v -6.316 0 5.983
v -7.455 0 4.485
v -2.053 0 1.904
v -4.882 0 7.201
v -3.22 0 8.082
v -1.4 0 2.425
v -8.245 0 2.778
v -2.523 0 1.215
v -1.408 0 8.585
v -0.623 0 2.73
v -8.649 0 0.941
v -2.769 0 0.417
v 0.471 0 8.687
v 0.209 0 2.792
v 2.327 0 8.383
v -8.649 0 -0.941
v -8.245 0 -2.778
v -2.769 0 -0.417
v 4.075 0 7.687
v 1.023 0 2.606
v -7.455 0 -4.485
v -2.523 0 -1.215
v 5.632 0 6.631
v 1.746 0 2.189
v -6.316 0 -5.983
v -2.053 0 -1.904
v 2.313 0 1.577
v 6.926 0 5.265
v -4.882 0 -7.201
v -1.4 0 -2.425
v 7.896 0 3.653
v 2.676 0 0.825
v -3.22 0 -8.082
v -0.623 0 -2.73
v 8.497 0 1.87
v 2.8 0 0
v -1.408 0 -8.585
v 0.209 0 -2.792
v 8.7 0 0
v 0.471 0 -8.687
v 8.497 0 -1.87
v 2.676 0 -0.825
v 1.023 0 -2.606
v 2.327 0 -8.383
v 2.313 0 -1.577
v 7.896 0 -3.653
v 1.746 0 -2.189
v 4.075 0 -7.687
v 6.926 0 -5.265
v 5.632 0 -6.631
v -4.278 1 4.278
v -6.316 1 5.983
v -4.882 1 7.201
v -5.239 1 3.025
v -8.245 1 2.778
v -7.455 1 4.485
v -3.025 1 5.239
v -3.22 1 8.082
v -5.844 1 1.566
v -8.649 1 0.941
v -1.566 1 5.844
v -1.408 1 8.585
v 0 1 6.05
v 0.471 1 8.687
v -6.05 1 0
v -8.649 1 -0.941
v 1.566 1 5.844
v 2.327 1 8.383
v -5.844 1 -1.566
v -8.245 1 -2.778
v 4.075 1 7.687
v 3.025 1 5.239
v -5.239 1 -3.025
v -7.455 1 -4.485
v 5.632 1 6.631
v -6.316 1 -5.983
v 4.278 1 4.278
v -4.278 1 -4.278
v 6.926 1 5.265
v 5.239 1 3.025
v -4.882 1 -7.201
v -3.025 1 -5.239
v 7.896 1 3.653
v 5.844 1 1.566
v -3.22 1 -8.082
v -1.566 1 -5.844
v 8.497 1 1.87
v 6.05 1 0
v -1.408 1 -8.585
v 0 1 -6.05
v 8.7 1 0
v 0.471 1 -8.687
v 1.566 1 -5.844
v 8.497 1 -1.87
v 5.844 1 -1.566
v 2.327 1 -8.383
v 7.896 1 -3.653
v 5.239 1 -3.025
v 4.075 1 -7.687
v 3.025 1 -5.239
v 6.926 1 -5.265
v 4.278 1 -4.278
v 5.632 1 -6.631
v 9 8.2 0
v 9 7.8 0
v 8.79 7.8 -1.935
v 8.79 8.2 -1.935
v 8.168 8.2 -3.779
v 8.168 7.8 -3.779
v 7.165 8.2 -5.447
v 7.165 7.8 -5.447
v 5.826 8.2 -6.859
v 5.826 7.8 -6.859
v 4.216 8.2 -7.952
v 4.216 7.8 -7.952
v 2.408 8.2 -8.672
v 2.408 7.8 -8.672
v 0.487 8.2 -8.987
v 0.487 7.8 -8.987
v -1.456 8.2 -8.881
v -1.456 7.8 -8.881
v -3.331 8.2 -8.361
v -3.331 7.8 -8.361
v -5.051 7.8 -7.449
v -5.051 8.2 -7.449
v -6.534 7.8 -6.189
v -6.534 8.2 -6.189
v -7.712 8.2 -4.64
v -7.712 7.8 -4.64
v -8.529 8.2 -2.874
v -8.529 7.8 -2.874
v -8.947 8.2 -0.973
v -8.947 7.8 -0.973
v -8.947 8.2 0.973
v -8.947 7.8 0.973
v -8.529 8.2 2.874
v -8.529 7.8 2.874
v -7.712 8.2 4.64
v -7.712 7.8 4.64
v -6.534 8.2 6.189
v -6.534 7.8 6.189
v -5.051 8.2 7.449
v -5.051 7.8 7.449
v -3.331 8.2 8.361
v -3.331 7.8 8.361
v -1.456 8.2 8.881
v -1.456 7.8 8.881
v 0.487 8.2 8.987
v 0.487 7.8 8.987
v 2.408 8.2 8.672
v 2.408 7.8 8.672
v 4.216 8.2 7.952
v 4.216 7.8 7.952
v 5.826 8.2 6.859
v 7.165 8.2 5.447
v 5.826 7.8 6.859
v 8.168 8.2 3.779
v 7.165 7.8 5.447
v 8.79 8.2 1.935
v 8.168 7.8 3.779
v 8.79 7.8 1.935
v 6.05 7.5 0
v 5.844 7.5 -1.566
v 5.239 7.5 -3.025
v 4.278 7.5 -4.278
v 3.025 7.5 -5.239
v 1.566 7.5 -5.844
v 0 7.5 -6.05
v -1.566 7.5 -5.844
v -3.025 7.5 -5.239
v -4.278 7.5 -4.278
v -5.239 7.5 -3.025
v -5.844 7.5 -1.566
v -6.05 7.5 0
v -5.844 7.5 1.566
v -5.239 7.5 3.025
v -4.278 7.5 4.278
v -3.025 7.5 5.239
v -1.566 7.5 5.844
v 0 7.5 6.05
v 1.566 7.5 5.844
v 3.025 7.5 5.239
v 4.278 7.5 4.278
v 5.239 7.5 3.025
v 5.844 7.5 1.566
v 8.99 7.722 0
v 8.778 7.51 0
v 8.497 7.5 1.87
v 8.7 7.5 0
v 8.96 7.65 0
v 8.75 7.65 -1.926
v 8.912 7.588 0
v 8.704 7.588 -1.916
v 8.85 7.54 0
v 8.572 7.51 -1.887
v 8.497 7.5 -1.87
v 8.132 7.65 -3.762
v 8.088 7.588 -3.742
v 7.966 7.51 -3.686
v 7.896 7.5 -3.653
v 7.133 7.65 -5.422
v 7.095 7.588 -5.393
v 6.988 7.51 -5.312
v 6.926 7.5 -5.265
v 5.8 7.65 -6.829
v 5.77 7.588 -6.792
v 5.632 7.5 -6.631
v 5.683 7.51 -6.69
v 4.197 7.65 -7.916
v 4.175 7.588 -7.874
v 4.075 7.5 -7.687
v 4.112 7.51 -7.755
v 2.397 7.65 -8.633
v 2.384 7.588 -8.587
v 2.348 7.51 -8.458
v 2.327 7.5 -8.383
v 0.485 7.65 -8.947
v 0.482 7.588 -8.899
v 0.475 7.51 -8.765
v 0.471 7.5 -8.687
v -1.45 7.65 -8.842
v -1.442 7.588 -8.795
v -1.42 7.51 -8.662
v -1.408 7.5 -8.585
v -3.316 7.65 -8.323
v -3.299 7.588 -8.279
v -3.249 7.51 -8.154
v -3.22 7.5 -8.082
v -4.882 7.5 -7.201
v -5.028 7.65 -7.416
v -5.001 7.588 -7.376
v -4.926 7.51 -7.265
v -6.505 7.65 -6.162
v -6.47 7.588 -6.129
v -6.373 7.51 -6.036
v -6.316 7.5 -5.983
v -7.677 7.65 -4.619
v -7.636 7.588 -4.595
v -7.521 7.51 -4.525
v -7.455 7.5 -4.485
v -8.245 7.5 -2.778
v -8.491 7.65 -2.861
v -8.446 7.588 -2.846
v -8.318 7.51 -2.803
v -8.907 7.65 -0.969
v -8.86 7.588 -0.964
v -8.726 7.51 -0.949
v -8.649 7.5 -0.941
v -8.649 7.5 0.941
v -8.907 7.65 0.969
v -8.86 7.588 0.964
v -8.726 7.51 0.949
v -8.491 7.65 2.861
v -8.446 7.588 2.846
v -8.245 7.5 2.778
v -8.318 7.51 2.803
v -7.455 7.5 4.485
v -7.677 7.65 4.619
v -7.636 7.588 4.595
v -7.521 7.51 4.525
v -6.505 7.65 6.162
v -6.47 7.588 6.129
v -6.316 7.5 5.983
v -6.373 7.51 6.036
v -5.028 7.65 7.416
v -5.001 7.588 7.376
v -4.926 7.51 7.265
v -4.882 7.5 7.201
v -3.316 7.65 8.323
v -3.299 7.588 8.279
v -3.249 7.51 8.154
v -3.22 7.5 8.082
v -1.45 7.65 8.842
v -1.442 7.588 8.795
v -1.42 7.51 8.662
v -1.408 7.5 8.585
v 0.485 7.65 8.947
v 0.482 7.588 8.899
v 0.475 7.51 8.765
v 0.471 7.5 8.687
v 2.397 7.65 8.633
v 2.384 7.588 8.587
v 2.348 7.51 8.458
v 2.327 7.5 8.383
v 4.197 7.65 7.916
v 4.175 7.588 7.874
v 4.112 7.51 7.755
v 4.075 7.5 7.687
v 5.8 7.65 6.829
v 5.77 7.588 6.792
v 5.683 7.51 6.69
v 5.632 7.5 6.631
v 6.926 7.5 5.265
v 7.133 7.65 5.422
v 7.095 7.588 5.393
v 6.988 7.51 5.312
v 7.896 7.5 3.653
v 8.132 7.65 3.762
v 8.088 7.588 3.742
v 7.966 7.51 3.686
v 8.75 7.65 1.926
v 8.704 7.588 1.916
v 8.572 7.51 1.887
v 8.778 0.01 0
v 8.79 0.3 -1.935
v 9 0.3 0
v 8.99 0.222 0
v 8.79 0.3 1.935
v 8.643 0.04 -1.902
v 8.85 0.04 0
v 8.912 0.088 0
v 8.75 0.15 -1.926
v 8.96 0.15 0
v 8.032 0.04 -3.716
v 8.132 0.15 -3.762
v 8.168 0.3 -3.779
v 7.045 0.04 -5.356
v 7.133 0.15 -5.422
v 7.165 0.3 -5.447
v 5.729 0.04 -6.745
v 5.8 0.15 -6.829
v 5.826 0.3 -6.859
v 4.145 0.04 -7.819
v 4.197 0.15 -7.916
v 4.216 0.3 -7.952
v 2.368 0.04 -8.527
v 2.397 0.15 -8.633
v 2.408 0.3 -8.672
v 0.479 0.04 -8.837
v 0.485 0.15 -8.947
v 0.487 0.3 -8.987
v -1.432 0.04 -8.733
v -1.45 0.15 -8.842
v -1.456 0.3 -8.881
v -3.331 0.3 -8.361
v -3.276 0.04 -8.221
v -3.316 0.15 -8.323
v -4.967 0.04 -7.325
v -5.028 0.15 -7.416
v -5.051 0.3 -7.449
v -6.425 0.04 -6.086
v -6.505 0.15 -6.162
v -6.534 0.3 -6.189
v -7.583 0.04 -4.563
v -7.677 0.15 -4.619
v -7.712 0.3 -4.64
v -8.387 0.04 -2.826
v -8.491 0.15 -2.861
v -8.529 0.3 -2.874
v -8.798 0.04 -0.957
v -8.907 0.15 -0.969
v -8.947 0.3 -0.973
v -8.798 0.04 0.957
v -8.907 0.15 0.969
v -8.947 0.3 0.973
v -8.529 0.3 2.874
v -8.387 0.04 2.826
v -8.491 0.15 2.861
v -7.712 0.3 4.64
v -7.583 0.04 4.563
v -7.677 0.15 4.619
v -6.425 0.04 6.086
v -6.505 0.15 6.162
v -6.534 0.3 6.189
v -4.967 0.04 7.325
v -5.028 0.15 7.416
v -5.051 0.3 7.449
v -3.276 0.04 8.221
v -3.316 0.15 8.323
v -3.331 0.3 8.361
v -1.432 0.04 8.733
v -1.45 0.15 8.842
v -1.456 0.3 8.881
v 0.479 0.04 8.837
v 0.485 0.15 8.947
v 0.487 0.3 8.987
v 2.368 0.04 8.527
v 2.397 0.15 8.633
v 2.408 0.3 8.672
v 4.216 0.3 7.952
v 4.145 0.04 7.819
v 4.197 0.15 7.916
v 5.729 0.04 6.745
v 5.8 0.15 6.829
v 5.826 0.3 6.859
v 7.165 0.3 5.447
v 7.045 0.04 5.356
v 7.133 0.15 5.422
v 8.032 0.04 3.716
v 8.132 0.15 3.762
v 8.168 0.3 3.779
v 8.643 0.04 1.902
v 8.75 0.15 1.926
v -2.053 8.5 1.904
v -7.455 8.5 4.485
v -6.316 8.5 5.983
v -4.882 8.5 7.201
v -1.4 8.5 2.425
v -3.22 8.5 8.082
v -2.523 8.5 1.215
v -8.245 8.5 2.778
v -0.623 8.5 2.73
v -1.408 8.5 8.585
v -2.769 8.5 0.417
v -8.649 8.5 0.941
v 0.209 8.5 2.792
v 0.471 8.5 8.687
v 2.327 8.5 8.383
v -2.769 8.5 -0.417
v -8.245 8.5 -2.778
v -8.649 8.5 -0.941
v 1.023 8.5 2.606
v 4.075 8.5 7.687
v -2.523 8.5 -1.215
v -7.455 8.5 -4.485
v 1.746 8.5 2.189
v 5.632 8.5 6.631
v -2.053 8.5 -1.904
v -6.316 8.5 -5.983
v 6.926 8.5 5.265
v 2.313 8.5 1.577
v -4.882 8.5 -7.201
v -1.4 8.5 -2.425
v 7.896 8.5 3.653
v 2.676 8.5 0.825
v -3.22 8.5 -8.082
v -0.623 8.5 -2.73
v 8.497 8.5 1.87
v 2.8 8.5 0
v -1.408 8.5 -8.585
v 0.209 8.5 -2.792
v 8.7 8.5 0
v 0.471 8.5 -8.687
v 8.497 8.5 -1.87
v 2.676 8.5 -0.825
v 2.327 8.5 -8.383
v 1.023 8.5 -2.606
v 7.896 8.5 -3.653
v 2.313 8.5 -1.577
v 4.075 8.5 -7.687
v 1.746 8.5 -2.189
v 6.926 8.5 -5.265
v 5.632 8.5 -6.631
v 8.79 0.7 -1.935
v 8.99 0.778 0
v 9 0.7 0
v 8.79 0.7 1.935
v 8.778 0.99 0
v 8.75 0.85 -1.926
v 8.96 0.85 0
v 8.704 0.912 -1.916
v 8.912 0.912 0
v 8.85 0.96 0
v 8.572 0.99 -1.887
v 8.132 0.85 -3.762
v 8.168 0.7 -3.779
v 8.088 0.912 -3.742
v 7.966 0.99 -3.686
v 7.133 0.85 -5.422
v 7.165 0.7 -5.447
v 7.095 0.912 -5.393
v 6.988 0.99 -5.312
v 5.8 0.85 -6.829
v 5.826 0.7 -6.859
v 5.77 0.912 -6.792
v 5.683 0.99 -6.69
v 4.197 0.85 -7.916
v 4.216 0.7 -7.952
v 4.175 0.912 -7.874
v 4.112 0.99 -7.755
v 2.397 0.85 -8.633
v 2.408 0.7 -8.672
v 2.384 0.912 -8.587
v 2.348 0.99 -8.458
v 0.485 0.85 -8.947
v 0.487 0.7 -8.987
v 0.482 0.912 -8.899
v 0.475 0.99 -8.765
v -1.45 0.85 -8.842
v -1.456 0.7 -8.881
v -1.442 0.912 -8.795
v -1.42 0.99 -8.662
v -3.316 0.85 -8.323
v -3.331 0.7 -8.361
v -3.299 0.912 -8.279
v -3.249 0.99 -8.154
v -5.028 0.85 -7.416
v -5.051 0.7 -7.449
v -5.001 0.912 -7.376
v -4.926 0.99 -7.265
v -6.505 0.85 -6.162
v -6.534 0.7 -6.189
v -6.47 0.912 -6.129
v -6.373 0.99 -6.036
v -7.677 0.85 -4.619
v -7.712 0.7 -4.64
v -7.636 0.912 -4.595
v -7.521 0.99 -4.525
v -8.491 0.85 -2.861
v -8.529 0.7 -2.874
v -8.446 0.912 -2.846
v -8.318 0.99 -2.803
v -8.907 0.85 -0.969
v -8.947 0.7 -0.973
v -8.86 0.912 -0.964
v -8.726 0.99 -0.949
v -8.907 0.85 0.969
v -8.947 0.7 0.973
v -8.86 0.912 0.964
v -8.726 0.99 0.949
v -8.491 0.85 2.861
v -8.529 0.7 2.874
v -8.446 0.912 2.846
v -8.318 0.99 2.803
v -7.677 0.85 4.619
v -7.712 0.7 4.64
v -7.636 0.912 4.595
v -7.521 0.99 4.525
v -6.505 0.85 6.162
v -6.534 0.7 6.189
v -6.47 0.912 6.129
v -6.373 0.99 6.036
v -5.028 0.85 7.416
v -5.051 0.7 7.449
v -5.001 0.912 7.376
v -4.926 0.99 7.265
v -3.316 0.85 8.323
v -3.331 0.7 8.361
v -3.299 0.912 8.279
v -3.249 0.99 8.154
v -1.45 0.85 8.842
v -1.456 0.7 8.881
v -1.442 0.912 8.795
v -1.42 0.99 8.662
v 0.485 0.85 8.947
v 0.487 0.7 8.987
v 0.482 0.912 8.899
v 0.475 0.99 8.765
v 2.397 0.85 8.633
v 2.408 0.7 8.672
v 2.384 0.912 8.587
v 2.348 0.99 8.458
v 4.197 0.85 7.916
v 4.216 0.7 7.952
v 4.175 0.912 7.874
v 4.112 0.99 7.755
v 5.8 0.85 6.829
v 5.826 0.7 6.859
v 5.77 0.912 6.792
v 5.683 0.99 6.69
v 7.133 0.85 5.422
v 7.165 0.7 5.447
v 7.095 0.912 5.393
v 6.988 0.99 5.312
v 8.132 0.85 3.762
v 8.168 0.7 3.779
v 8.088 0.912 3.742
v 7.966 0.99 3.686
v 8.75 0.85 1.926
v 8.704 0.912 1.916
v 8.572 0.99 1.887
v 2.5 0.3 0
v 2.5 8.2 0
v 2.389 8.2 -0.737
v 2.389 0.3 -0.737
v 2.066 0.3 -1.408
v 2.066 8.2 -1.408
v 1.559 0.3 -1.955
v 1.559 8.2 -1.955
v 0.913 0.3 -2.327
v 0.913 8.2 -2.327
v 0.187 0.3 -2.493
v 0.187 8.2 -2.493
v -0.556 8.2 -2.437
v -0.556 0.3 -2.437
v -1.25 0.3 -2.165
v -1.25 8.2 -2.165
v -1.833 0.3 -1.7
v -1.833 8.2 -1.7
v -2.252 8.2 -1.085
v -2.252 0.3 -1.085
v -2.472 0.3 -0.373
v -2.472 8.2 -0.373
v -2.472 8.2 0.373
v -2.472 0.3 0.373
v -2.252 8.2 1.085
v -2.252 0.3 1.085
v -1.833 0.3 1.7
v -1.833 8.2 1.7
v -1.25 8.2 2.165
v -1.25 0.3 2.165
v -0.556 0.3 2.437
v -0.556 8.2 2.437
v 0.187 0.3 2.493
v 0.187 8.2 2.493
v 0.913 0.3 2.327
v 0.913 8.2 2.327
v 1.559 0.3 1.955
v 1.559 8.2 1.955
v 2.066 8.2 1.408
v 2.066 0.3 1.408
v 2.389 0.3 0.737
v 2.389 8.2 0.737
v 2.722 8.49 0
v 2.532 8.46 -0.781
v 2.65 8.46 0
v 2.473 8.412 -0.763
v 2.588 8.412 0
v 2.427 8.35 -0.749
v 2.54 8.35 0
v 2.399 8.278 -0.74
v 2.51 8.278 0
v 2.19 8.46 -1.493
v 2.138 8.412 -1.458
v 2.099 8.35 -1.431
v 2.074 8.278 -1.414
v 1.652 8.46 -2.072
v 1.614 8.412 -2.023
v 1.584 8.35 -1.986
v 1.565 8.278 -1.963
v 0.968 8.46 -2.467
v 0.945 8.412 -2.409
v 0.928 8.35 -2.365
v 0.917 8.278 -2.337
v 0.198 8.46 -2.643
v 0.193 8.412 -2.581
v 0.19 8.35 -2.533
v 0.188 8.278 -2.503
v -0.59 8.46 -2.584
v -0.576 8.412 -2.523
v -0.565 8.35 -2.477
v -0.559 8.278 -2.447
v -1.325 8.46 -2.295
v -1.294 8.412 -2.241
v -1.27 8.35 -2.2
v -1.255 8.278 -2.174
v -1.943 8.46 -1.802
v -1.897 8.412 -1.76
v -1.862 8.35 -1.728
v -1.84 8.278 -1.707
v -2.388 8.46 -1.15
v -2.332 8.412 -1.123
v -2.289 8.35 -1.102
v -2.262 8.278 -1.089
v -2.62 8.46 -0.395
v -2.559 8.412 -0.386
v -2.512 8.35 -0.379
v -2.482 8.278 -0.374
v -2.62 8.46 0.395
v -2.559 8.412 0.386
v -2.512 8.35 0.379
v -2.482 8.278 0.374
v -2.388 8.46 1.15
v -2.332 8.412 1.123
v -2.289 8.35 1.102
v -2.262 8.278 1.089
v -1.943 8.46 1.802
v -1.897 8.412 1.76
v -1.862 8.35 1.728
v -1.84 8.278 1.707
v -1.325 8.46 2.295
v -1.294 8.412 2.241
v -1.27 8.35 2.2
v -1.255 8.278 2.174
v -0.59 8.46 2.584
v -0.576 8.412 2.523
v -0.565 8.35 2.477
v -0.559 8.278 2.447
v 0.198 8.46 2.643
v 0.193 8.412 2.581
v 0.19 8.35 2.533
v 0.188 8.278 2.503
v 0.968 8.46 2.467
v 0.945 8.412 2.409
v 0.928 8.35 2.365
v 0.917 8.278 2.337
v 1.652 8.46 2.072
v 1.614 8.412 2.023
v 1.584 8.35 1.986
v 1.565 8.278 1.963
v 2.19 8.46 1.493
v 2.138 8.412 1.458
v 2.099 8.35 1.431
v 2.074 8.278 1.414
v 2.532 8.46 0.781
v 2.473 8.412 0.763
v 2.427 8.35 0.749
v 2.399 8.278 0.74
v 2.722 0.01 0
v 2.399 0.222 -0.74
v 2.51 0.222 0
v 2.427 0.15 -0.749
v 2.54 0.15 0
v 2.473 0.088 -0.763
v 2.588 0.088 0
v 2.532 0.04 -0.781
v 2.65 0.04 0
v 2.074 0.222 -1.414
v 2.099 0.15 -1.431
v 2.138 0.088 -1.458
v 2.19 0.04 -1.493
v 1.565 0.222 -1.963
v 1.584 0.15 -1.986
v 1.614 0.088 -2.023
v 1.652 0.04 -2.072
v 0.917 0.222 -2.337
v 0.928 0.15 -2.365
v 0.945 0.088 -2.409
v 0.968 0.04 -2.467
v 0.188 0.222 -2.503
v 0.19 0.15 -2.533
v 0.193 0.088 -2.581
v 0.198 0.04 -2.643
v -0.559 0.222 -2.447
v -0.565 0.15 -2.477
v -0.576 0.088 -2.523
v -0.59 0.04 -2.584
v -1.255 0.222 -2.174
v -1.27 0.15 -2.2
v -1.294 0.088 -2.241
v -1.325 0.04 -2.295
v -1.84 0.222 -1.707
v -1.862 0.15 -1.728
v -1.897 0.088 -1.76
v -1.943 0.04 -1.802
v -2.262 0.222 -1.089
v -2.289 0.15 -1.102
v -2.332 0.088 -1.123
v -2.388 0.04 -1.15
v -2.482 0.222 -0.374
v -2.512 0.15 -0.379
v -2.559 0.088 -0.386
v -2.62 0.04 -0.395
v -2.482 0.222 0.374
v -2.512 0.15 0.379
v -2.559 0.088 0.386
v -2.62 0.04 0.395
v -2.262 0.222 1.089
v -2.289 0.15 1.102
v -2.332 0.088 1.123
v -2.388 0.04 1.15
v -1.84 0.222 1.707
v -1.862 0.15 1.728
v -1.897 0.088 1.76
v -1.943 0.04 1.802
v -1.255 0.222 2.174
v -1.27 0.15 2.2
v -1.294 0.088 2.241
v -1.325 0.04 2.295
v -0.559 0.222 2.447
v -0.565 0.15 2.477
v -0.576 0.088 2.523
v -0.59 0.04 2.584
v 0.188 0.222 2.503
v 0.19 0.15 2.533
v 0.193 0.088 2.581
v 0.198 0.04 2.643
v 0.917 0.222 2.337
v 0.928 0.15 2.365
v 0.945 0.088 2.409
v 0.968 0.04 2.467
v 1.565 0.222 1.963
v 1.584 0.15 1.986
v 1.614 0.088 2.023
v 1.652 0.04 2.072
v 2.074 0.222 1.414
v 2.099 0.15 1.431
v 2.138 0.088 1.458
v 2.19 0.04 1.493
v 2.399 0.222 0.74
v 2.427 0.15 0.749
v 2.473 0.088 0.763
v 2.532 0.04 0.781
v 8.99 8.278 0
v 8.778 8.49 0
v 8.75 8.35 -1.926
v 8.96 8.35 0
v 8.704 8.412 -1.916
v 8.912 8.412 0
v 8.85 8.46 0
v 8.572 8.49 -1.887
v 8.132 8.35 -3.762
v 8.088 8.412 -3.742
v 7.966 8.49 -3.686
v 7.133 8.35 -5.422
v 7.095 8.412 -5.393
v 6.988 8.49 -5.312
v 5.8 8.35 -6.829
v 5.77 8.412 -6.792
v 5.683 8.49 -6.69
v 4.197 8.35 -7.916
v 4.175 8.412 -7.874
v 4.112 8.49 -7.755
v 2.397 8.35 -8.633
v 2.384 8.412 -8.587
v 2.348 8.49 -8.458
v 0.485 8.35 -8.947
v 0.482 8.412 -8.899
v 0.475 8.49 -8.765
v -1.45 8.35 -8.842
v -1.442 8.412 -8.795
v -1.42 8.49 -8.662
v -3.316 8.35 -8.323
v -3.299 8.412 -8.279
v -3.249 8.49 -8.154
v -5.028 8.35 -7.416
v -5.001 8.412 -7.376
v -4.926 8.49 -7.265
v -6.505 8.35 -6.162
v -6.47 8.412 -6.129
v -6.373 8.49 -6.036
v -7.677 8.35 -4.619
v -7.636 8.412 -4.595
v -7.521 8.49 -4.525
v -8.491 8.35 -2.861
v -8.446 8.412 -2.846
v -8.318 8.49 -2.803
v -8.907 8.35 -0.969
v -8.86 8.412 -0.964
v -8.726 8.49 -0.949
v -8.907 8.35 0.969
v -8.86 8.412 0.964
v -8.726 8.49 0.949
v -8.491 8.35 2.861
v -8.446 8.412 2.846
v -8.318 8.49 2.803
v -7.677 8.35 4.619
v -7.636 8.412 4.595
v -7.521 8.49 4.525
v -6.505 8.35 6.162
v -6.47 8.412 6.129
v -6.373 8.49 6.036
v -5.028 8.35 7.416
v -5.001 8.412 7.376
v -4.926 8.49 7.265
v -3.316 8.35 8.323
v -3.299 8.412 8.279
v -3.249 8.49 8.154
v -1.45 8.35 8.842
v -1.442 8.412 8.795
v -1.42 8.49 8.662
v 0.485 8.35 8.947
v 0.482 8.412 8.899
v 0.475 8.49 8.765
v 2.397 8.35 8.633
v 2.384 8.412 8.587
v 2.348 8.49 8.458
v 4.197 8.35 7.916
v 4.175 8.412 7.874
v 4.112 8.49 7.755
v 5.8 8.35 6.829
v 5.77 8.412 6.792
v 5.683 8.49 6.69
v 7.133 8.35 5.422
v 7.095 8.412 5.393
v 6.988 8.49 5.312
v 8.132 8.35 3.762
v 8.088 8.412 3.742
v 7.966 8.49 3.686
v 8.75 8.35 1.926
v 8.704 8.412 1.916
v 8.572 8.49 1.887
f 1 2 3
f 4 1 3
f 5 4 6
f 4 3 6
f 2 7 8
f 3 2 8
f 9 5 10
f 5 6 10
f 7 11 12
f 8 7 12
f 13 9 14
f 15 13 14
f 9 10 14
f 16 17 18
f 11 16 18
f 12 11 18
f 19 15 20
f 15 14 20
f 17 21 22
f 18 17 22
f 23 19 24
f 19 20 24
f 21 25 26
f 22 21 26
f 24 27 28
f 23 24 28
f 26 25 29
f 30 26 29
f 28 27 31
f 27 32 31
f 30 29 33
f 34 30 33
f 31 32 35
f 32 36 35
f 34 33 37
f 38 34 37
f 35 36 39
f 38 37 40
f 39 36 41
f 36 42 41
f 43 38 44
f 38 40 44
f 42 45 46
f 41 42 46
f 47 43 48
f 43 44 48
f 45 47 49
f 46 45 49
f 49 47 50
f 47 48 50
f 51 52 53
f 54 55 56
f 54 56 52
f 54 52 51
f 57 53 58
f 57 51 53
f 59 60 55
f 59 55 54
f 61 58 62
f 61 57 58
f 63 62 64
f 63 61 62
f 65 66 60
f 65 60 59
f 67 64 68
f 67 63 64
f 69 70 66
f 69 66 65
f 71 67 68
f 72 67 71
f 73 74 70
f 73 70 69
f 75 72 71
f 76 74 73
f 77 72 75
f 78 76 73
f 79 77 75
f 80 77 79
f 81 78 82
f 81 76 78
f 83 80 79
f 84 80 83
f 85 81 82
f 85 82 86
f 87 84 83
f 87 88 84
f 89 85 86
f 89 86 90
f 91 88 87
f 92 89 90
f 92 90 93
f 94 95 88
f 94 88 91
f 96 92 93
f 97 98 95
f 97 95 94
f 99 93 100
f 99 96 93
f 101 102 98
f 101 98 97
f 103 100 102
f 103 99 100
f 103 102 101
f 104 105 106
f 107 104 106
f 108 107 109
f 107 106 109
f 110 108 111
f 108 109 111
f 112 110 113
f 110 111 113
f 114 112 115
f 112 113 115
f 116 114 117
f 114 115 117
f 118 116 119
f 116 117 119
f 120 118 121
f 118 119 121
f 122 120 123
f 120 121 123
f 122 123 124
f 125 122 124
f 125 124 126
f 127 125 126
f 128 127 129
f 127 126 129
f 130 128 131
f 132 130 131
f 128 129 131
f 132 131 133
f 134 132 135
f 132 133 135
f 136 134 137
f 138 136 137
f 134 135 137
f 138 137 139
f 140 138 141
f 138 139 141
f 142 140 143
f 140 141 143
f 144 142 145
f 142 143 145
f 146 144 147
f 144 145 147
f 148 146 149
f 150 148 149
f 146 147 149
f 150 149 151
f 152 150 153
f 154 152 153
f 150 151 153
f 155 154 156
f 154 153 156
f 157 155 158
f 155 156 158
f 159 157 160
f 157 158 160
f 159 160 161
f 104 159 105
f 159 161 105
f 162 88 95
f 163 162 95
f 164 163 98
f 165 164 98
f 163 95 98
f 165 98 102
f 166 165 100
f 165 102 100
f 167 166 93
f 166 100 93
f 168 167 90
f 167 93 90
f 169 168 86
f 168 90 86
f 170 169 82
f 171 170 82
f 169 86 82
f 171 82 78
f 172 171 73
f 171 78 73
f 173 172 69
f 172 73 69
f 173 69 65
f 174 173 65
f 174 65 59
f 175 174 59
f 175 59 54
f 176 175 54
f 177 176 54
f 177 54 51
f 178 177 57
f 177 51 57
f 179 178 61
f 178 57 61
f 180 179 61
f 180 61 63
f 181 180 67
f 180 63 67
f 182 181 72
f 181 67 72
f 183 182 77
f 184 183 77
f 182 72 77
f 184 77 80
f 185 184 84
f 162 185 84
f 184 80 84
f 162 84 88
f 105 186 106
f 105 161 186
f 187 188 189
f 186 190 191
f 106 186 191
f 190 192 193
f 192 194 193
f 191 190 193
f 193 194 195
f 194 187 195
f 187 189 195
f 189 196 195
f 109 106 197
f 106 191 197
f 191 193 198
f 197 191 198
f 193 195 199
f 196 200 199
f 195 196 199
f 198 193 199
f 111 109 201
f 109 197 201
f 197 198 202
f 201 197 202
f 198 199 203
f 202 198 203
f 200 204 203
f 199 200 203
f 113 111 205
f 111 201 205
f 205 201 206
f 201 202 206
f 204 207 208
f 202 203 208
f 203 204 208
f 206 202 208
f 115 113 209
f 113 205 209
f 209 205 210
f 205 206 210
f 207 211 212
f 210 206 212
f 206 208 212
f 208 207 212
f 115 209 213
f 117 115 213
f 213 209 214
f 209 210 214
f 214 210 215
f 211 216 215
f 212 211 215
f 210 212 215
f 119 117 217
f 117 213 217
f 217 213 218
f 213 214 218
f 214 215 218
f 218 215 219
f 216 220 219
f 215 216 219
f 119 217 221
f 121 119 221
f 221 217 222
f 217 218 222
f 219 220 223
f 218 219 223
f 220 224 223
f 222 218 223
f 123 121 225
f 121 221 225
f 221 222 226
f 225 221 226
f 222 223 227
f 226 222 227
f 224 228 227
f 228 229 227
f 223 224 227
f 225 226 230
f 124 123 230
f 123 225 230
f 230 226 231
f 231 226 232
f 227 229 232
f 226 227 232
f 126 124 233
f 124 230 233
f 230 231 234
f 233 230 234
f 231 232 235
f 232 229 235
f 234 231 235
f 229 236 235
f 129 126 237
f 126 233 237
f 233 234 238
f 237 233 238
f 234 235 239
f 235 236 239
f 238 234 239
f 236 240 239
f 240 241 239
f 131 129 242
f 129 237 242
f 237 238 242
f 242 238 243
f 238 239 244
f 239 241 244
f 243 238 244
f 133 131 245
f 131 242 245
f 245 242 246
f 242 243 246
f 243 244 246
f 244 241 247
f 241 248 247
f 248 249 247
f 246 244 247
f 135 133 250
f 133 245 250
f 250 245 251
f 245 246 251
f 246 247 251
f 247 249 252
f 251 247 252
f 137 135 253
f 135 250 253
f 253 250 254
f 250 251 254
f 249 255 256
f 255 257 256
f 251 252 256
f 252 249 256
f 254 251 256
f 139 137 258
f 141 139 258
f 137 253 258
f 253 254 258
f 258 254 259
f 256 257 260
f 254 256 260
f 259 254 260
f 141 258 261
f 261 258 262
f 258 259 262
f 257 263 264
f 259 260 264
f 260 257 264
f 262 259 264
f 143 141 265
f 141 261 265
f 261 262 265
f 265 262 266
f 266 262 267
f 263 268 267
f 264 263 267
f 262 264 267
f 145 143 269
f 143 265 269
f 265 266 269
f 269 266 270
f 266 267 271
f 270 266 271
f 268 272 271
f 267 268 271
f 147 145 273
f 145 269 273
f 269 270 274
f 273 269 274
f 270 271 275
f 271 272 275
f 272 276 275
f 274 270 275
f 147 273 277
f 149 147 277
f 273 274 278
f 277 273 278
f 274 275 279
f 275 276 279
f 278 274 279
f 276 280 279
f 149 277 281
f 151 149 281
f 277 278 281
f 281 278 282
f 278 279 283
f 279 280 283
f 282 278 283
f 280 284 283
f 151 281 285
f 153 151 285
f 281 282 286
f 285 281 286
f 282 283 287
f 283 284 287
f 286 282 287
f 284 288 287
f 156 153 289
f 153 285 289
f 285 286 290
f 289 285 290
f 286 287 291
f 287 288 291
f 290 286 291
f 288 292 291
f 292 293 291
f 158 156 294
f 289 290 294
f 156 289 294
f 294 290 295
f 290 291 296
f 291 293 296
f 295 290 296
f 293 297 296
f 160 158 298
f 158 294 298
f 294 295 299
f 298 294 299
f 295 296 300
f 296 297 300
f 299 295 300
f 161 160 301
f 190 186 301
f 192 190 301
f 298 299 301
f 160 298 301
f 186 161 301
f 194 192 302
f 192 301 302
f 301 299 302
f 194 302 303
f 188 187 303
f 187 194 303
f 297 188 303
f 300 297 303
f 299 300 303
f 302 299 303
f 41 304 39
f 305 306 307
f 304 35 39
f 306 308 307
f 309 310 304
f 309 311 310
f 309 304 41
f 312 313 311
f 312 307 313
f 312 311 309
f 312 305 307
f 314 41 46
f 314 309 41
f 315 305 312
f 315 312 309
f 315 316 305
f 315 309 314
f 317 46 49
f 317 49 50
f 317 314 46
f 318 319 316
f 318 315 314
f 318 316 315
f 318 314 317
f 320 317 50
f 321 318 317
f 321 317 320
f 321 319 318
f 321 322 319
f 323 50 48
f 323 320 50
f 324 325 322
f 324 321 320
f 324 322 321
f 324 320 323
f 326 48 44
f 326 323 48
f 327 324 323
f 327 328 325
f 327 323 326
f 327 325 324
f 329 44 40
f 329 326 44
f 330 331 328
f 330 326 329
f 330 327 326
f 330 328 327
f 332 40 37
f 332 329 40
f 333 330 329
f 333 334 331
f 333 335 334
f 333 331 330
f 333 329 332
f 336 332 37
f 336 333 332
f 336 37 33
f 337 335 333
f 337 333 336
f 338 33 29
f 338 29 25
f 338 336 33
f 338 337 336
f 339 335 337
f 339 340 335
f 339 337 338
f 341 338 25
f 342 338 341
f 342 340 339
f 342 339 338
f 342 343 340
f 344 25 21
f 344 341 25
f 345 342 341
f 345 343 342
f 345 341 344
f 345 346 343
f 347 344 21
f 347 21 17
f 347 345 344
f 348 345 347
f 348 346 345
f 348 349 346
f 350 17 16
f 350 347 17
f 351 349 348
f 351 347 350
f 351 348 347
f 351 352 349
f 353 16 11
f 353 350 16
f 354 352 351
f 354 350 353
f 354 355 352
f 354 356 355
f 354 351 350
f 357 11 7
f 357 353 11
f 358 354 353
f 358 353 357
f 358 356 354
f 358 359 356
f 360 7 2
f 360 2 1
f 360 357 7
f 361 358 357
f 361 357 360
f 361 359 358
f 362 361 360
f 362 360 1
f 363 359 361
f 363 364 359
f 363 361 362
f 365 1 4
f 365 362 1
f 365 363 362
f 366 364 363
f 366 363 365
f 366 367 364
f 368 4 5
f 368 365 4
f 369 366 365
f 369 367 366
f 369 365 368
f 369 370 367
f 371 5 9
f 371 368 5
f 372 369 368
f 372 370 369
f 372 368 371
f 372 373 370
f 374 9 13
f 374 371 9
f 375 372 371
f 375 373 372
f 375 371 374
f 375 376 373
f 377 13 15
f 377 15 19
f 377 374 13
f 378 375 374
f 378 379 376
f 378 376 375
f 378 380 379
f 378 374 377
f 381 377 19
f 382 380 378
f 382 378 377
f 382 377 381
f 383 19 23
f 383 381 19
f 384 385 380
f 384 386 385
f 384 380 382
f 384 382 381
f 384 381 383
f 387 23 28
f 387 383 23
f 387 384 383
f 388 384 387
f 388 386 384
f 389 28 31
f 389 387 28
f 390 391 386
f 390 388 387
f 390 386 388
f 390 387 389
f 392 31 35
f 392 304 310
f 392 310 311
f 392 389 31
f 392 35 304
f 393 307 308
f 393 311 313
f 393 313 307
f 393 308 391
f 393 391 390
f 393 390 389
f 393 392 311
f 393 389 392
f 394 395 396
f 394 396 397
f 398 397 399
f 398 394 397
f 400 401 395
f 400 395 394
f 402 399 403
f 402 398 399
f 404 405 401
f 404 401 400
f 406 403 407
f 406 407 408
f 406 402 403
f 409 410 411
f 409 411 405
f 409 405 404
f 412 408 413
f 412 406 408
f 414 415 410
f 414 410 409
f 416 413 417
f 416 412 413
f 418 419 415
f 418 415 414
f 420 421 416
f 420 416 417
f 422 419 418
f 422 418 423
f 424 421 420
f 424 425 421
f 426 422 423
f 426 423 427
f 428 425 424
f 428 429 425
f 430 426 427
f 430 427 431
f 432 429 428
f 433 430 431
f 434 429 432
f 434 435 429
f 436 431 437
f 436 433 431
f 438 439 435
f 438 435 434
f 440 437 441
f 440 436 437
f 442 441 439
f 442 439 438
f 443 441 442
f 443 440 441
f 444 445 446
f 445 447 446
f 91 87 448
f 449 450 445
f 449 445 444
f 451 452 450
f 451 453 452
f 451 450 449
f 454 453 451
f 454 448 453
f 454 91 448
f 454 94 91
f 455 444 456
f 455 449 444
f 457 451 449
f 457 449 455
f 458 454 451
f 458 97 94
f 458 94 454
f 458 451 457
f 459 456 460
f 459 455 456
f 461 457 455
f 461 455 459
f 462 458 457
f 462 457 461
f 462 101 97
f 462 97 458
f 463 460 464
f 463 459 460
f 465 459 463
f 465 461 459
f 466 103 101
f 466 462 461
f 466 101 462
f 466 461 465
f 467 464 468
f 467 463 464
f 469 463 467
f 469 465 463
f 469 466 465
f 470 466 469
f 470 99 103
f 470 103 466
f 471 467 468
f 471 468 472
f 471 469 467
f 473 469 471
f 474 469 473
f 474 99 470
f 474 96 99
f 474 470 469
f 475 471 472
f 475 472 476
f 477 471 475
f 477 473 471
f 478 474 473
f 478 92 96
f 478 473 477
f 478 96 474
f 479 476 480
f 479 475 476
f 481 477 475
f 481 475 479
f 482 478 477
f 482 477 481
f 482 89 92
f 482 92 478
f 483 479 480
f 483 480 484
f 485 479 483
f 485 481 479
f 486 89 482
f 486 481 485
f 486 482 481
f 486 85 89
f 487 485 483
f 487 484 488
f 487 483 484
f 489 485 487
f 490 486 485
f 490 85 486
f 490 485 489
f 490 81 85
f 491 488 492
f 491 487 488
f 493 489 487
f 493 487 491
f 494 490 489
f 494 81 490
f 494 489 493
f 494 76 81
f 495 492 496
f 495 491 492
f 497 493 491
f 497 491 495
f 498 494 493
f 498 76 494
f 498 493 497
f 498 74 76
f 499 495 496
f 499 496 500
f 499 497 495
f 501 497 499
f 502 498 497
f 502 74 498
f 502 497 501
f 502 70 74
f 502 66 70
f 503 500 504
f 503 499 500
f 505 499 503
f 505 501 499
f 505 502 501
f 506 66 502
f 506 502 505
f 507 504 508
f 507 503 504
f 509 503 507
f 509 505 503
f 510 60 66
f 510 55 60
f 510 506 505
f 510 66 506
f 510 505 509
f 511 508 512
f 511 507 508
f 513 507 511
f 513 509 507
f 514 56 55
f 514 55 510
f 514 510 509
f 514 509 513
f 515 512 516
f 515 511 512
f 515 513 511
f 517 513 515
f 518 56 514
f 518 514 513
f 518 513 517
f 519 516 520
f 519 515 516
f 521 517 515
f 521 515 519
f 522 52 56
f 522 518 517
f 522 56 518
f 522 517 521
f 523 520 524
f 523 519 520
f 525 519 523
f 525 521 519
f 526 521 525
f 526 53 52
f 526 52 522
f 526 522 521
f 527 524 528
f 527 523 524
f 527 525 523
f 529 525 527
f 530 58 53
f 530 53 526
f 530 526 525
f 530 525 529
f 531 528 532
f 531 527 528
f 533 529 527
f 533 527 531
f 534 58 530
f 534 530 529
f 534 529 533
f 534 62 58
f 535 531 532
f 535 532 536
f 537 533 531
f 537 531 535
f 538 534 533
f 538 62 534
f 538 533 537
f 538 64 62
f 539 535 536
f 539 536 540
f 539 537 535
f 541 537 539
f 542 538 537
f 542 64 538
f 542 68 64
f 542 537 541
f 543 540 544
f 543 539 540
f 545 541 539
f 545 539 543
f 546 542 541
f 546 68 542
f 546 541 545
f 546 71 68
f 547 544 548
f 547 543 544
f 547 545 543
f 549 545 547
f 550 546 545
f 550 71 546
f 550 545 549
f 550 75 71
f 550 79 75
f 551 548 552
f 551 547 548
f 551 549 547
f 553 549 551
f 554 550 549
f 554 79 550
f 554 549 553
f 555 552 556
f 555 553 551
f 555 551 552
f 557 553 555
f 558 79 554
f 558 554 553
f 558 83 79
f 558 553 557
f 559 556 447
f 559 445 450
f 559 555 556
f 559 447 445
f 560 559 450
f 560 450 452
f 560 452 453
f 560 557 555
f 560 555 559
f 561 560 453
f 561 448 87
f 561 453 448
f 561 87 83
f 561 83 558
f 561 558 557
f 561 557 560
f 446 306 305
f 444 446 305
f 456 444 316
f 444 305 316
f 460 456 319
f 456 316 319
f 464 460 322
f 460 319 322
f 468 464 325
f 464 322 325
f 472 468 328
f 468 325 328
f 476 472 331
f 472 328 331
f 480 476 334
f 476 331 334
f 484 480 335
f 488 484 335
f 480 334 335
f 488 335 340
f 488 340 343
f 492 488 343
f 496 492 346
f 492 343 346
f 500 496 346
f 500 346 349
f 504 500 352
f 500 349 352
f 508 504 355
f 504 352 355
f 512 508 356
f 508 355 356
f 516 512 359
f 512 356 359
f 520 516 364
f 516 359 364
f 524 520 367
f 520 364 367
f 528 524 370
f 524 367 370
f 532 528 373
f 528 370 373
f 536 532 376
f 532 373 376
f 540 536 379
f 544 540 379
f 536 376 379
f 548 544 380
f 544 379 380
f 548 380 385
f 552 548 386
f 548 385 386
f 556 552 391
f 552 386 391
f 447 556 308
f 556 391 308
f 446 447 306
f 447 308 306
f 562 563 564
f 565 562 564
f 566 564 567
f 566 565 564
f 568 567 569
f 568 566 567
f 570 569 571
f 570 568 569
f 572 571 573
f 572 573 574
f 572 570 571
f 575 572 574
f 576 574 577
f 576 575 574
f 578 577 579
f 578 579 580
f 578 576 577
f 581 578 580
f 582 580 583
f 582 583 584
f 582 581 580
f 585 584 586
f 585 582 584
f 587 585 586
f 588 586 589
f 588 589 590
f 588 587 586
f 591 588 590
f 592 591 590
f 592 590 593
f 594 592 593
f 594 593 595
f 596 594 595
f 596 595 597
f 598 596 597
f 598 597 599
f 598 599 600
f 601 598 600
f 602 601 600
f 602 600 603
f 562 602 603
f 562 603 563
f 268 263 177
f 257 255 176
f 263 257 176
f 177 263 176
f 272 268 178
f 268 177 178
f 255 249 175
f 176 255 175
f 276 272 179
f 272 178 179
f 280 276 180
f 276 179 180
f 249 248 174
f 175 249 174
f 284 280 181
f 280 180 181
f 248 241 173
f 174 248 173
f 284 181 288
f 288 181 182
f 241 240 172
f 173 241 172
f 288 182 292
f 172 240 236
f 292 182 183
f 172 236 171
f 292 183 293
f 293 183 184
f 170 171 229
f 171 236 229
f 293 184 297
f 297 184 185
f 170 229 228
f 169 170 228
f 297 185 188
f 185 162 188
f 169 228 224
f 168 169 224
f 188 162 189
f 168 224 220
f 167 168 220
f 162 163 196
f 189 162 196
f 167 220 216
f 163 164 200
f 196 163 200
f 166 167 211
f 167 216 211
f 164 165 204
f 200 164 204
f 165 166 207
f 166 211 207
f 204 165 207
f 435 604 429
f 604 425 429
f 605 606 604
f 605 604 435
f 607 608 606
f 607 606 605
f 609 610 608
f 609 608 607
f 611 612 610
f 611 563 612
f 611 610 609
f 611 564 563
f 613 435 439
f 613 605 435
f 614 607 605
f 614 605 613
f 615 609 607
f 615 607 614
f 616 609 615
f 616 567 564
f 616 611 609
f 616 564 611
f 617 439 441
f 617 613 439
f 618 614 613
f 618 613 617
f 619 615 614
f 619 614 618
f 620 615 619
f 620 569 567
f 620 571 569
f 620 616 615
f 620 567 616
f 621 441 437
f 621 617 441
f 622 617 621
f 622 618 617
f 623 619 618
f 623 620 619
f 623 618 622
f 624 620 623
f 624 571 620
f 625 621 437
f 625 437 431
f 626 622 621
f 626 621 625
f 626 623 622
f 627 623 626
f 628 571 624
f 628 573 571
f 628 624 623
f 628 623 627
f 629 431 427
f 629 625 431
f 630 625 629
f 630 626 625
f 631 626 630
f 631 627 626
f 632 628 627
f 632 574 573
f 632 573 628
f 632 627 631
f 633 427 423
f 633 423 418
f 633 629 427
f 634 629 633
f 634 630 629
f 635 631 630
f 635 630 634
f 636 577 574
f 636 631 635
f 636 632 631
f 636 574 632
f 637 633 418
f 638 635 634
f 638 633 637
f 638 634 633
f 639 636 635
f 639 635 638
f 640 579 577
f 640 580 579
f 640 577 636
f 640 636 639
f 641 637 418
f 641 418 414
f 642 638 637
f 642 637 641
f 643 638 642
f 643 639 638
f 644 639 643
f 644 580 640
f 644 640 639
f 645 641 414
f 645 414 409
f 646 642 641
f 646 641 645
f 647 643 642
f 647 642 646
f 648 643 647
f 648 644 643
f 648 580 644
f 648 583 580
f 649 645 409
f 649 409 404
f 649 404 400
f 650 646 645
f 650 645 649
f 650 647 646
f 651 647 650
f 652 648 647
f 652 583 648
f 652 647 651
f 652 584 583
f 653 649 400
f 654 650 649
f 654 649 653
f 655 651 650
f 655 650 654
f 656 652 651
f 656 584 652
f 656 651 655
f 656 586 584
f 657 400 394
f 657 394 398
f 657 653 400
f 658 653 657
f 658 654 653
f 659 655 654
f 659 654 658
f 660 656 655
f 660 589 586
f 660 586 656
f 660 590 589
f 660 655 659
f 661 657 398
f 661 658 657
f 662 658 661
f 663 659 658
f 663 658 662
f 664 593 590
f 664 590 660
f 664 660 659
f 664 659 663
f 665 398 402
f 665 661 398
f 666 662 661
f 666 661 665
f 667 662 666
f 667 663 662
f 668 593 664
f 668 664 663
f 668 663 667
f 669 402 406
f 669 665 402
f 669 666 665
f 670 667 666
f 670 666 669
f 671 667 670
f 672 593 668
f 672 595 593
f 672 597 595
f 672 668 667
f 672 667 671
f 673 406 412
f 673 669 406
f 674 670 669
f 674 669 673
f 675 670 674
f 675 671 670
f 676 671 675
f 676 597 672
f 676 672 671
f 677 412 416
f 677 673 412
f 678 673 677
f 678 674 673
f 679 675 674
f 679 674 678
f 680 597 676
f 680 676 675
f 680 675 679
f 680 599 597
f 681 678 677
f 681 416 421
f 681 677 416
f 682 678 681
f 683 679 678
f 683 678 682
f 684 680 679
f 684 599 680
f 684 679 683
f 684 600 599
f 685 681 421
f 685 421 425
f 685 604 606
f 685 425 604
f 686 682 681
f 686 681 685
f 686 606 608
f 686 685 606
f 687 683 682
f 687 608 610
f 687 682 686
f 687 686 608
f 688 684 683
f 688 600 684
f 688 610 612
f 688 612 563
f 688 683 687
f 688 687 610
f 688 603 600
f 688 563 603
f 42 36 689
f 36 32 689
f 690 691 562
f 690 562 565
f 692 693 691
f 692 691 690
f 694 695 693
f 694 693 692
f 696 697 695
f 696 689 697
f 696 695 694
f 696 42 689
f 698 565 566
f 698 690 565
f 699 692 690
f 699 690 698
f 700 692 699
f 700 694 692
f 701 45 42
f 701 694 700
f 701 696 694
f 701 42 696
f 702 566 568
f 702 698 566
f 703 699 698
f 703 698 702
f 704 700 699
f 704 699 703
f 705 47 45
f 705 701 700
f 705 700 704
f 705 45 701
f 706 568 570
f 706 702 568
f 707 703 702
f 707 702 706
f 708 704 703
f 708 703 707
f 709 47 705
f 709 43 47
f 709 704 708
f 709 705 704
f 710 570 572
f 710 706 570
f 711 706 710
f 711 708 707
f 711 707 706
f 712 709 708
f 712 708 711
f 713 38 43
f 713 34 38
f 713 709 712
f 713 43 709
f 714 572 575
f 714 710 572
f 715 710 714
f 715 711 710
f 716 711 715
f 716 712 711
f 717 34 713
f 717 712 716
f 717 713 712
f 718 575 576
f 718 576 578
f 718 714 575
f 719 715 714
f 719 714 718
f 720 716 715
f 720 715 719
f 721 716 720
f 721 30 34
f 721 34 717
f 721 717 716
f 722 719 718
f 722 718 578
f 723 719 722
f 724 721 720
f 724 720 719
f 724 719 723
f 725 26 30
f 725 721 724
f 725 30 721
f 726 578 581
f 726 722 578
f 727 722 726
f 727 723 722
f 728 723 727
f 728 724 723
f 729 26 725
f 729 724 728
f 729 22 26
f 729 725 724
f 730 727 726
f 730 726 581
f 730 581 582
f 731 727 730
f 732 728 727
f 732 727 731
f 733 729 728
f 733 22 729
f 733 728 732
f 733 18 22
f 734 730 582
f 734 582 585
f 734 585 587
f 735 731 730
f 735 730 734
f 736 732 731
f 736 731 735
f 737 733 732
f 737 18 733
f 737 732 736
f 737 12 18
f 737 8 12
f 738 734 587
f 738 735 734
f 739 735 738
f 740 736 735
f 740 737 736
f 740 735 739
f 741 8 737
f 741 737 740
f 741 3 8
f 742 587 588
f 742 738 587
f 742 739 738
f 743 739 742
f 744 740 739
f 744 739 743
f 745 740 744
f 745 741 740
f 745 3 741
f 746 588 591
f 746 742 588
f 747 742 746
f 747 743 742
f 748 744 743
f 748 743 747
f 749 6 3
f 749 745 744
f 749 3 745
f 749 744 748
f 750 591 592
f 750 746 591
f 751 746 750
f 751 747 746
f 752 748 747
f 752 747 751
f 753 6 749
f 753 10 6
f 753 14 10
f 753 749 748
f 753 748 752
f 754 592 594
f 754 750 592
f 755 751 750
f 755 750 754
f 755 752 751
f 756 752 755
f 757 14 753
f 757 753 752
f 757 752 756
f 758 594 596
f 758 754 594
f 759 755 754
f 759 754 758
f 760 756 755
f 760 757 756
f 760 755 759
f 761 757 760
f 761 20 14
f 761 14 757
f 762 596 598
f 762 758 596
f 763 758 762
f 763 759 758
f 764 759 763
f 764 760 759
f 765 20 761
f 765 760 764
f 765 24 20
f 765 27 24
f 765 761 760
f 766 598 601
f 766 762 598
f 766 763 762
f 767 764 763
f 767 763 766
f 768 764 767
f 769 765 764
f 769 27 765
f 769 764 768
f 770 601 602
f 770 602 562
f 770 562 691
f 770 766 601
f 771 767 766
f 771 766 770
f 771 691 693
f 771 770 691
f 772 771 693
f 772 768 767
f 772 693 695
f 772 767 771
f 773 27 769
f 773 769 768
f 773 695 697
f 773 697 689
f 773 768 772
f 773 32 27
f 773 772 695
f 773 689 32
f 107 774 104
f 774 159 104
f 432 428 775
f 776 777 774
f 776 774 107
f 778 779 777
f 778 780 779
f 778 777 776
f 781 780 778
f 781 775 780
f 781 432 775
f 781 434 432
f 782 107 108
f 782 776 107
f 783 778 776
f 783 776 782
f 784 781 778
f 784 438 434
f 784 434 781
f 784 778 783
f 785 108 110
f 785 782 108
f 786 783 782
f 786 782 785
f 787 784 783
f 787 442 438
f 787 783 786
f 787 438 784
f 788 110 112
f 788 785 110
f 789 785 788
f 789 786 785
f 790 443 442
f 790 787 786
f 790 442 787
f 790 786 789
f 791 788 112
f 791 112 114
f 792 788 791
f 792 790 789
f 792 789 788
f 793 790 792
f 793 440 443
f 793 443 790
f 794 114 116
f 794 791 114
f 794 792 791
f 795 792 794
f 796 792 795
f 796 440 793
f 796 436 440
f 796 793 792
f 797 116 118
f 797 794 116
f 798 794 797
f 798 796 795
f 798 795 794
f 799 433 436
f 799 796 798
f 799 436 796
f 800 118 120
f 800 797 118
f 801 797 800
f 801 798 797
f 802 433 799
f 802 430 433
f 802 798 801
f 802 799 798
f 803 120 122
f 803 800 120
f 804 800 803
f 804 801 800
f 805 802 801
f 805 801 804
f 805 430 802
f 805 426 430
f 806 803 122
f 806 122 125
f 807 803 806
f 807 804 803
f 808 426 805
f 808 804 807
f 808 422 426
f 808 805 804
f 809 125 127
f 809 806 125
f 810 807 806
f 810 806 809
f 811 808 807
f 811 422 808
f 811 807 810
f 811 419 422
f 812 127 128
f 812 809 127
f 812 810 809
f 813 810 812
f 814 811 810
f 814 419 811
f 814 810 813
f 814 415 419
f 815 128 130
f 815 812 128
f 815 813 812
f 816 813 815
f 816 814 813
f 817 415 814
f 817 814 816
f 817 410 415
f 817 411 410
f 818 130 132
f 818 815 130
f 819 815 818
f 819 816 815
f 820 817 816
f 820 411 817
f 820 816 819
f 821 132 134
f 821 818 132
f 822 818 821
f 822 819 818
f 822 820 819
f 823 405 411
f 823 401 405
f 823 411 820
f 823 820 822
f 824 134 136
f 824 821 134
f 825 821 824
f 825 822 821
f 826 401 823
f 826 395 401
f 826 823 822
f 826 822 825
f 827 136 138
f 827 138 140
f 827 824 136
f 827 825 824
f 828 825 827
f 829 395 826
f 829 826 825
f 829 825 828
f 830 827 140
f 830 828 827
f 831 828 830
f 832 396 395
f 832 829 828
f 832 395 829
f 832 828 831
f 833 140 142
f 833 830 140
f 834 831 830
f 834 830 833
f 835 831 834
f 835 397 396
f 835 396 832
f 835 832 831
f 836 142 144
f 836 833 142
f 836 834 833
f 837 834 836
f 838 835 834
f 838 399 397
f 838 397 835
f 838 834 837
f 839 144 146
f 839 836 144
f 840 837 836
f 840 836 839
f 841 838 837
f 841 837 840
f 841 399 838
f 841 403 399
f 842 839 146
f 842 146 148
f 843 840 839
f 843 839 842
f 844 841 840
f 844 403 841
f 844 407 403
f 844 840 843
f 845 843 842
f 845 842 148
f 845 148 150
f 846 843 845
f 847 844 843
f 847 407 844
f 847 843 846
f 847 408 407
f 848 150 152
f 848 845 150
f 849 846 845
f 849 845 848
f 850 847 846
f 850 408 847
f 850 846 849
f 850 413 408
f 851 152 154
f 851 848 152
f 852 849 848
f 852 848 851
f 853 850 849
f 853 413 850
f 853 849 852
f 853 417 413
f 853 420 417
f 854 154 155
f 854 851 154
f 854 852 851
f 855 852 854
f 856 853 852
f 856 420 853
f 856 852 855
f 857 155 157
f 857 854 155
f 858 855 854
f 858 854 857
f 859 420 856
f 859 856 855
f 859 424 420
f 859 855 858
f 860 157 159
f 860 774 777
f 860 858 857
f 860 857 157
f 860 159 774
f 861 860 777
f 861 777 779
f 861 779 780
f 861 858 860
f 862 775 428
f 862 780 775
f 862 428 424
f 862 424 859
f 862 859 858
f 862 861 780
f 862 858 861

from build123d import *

# Parameters (mm, degrees)
SKETCH1_R           = 9
SKETCH1_R_2         = 2.5
BOSS_EXTRUDE1_DEPTH = 1
SKETCH2_R           = 6.05
SKETCH2_R_2         = 2.5
BOSS_EXTRUDE2_DEPTH = 6.5
SKETCH3_R           = 9
SKETCH3_R_2         = 2.5
BOSS_EXTRUDE3_DEPTH = 1
FILLET1_R           = 0.3


with BuildPart() as part:
    # Sketch1 → Boss-Extrude1 (new body)
    with BuildSketch(Plane(origin=(0, 0, 0), x_dir=(1, 0, 0), z_dir=(0, 1, 0))):
        Circle(SKETCH1_R)
        Circle(SKETCH1_R_2, mode=Mode.SUBTRACT)
    extrude(amount=BOSS_EXTRUDE1_DEPTH)

    # Sketch2 → Boss-Extrude2 (add)
    with BuildSketch(Plane(origin=(0, 1, 0), x_dir=(1, 0, 0), z_dir=(0, 1, 0))):
        Circle(SKETCH2_R)
        Circle(SKETCH2_R_2, mode=Mode.SUBTRACT)
    extrude(amount=BOSS_EXTRUDE2_DEPTH)

    # Sketch3 → Boss-Extrude3 (add)
    with BuildSketch(Plane(origin=(0, 7.5, 0), x_dir=(1, 0, 0), z_dir=(0, 1, 0))):
        Circle(SKETCH3_R)
        Circle(SKETCH3_R_2, mode=Mode.SUBTRACT)
    extrude(amount=BOSS_EXTRUDE3_DEPTH)

    # Fillet1
    fillet1_edges = [part.edges().sort_by_distance(p)[0] for p in [
        (-9, 8.5, 0),
        (-9, 7.5, 0),
        (-2.5, 8.5, 0),
        (-9, 0, 0),
        (-9, 1, 0),
        (-2.5, 0, 0),
    ]]
    fillet(fillet1_edges, radius=FILLET1_R)


solid = part.part
